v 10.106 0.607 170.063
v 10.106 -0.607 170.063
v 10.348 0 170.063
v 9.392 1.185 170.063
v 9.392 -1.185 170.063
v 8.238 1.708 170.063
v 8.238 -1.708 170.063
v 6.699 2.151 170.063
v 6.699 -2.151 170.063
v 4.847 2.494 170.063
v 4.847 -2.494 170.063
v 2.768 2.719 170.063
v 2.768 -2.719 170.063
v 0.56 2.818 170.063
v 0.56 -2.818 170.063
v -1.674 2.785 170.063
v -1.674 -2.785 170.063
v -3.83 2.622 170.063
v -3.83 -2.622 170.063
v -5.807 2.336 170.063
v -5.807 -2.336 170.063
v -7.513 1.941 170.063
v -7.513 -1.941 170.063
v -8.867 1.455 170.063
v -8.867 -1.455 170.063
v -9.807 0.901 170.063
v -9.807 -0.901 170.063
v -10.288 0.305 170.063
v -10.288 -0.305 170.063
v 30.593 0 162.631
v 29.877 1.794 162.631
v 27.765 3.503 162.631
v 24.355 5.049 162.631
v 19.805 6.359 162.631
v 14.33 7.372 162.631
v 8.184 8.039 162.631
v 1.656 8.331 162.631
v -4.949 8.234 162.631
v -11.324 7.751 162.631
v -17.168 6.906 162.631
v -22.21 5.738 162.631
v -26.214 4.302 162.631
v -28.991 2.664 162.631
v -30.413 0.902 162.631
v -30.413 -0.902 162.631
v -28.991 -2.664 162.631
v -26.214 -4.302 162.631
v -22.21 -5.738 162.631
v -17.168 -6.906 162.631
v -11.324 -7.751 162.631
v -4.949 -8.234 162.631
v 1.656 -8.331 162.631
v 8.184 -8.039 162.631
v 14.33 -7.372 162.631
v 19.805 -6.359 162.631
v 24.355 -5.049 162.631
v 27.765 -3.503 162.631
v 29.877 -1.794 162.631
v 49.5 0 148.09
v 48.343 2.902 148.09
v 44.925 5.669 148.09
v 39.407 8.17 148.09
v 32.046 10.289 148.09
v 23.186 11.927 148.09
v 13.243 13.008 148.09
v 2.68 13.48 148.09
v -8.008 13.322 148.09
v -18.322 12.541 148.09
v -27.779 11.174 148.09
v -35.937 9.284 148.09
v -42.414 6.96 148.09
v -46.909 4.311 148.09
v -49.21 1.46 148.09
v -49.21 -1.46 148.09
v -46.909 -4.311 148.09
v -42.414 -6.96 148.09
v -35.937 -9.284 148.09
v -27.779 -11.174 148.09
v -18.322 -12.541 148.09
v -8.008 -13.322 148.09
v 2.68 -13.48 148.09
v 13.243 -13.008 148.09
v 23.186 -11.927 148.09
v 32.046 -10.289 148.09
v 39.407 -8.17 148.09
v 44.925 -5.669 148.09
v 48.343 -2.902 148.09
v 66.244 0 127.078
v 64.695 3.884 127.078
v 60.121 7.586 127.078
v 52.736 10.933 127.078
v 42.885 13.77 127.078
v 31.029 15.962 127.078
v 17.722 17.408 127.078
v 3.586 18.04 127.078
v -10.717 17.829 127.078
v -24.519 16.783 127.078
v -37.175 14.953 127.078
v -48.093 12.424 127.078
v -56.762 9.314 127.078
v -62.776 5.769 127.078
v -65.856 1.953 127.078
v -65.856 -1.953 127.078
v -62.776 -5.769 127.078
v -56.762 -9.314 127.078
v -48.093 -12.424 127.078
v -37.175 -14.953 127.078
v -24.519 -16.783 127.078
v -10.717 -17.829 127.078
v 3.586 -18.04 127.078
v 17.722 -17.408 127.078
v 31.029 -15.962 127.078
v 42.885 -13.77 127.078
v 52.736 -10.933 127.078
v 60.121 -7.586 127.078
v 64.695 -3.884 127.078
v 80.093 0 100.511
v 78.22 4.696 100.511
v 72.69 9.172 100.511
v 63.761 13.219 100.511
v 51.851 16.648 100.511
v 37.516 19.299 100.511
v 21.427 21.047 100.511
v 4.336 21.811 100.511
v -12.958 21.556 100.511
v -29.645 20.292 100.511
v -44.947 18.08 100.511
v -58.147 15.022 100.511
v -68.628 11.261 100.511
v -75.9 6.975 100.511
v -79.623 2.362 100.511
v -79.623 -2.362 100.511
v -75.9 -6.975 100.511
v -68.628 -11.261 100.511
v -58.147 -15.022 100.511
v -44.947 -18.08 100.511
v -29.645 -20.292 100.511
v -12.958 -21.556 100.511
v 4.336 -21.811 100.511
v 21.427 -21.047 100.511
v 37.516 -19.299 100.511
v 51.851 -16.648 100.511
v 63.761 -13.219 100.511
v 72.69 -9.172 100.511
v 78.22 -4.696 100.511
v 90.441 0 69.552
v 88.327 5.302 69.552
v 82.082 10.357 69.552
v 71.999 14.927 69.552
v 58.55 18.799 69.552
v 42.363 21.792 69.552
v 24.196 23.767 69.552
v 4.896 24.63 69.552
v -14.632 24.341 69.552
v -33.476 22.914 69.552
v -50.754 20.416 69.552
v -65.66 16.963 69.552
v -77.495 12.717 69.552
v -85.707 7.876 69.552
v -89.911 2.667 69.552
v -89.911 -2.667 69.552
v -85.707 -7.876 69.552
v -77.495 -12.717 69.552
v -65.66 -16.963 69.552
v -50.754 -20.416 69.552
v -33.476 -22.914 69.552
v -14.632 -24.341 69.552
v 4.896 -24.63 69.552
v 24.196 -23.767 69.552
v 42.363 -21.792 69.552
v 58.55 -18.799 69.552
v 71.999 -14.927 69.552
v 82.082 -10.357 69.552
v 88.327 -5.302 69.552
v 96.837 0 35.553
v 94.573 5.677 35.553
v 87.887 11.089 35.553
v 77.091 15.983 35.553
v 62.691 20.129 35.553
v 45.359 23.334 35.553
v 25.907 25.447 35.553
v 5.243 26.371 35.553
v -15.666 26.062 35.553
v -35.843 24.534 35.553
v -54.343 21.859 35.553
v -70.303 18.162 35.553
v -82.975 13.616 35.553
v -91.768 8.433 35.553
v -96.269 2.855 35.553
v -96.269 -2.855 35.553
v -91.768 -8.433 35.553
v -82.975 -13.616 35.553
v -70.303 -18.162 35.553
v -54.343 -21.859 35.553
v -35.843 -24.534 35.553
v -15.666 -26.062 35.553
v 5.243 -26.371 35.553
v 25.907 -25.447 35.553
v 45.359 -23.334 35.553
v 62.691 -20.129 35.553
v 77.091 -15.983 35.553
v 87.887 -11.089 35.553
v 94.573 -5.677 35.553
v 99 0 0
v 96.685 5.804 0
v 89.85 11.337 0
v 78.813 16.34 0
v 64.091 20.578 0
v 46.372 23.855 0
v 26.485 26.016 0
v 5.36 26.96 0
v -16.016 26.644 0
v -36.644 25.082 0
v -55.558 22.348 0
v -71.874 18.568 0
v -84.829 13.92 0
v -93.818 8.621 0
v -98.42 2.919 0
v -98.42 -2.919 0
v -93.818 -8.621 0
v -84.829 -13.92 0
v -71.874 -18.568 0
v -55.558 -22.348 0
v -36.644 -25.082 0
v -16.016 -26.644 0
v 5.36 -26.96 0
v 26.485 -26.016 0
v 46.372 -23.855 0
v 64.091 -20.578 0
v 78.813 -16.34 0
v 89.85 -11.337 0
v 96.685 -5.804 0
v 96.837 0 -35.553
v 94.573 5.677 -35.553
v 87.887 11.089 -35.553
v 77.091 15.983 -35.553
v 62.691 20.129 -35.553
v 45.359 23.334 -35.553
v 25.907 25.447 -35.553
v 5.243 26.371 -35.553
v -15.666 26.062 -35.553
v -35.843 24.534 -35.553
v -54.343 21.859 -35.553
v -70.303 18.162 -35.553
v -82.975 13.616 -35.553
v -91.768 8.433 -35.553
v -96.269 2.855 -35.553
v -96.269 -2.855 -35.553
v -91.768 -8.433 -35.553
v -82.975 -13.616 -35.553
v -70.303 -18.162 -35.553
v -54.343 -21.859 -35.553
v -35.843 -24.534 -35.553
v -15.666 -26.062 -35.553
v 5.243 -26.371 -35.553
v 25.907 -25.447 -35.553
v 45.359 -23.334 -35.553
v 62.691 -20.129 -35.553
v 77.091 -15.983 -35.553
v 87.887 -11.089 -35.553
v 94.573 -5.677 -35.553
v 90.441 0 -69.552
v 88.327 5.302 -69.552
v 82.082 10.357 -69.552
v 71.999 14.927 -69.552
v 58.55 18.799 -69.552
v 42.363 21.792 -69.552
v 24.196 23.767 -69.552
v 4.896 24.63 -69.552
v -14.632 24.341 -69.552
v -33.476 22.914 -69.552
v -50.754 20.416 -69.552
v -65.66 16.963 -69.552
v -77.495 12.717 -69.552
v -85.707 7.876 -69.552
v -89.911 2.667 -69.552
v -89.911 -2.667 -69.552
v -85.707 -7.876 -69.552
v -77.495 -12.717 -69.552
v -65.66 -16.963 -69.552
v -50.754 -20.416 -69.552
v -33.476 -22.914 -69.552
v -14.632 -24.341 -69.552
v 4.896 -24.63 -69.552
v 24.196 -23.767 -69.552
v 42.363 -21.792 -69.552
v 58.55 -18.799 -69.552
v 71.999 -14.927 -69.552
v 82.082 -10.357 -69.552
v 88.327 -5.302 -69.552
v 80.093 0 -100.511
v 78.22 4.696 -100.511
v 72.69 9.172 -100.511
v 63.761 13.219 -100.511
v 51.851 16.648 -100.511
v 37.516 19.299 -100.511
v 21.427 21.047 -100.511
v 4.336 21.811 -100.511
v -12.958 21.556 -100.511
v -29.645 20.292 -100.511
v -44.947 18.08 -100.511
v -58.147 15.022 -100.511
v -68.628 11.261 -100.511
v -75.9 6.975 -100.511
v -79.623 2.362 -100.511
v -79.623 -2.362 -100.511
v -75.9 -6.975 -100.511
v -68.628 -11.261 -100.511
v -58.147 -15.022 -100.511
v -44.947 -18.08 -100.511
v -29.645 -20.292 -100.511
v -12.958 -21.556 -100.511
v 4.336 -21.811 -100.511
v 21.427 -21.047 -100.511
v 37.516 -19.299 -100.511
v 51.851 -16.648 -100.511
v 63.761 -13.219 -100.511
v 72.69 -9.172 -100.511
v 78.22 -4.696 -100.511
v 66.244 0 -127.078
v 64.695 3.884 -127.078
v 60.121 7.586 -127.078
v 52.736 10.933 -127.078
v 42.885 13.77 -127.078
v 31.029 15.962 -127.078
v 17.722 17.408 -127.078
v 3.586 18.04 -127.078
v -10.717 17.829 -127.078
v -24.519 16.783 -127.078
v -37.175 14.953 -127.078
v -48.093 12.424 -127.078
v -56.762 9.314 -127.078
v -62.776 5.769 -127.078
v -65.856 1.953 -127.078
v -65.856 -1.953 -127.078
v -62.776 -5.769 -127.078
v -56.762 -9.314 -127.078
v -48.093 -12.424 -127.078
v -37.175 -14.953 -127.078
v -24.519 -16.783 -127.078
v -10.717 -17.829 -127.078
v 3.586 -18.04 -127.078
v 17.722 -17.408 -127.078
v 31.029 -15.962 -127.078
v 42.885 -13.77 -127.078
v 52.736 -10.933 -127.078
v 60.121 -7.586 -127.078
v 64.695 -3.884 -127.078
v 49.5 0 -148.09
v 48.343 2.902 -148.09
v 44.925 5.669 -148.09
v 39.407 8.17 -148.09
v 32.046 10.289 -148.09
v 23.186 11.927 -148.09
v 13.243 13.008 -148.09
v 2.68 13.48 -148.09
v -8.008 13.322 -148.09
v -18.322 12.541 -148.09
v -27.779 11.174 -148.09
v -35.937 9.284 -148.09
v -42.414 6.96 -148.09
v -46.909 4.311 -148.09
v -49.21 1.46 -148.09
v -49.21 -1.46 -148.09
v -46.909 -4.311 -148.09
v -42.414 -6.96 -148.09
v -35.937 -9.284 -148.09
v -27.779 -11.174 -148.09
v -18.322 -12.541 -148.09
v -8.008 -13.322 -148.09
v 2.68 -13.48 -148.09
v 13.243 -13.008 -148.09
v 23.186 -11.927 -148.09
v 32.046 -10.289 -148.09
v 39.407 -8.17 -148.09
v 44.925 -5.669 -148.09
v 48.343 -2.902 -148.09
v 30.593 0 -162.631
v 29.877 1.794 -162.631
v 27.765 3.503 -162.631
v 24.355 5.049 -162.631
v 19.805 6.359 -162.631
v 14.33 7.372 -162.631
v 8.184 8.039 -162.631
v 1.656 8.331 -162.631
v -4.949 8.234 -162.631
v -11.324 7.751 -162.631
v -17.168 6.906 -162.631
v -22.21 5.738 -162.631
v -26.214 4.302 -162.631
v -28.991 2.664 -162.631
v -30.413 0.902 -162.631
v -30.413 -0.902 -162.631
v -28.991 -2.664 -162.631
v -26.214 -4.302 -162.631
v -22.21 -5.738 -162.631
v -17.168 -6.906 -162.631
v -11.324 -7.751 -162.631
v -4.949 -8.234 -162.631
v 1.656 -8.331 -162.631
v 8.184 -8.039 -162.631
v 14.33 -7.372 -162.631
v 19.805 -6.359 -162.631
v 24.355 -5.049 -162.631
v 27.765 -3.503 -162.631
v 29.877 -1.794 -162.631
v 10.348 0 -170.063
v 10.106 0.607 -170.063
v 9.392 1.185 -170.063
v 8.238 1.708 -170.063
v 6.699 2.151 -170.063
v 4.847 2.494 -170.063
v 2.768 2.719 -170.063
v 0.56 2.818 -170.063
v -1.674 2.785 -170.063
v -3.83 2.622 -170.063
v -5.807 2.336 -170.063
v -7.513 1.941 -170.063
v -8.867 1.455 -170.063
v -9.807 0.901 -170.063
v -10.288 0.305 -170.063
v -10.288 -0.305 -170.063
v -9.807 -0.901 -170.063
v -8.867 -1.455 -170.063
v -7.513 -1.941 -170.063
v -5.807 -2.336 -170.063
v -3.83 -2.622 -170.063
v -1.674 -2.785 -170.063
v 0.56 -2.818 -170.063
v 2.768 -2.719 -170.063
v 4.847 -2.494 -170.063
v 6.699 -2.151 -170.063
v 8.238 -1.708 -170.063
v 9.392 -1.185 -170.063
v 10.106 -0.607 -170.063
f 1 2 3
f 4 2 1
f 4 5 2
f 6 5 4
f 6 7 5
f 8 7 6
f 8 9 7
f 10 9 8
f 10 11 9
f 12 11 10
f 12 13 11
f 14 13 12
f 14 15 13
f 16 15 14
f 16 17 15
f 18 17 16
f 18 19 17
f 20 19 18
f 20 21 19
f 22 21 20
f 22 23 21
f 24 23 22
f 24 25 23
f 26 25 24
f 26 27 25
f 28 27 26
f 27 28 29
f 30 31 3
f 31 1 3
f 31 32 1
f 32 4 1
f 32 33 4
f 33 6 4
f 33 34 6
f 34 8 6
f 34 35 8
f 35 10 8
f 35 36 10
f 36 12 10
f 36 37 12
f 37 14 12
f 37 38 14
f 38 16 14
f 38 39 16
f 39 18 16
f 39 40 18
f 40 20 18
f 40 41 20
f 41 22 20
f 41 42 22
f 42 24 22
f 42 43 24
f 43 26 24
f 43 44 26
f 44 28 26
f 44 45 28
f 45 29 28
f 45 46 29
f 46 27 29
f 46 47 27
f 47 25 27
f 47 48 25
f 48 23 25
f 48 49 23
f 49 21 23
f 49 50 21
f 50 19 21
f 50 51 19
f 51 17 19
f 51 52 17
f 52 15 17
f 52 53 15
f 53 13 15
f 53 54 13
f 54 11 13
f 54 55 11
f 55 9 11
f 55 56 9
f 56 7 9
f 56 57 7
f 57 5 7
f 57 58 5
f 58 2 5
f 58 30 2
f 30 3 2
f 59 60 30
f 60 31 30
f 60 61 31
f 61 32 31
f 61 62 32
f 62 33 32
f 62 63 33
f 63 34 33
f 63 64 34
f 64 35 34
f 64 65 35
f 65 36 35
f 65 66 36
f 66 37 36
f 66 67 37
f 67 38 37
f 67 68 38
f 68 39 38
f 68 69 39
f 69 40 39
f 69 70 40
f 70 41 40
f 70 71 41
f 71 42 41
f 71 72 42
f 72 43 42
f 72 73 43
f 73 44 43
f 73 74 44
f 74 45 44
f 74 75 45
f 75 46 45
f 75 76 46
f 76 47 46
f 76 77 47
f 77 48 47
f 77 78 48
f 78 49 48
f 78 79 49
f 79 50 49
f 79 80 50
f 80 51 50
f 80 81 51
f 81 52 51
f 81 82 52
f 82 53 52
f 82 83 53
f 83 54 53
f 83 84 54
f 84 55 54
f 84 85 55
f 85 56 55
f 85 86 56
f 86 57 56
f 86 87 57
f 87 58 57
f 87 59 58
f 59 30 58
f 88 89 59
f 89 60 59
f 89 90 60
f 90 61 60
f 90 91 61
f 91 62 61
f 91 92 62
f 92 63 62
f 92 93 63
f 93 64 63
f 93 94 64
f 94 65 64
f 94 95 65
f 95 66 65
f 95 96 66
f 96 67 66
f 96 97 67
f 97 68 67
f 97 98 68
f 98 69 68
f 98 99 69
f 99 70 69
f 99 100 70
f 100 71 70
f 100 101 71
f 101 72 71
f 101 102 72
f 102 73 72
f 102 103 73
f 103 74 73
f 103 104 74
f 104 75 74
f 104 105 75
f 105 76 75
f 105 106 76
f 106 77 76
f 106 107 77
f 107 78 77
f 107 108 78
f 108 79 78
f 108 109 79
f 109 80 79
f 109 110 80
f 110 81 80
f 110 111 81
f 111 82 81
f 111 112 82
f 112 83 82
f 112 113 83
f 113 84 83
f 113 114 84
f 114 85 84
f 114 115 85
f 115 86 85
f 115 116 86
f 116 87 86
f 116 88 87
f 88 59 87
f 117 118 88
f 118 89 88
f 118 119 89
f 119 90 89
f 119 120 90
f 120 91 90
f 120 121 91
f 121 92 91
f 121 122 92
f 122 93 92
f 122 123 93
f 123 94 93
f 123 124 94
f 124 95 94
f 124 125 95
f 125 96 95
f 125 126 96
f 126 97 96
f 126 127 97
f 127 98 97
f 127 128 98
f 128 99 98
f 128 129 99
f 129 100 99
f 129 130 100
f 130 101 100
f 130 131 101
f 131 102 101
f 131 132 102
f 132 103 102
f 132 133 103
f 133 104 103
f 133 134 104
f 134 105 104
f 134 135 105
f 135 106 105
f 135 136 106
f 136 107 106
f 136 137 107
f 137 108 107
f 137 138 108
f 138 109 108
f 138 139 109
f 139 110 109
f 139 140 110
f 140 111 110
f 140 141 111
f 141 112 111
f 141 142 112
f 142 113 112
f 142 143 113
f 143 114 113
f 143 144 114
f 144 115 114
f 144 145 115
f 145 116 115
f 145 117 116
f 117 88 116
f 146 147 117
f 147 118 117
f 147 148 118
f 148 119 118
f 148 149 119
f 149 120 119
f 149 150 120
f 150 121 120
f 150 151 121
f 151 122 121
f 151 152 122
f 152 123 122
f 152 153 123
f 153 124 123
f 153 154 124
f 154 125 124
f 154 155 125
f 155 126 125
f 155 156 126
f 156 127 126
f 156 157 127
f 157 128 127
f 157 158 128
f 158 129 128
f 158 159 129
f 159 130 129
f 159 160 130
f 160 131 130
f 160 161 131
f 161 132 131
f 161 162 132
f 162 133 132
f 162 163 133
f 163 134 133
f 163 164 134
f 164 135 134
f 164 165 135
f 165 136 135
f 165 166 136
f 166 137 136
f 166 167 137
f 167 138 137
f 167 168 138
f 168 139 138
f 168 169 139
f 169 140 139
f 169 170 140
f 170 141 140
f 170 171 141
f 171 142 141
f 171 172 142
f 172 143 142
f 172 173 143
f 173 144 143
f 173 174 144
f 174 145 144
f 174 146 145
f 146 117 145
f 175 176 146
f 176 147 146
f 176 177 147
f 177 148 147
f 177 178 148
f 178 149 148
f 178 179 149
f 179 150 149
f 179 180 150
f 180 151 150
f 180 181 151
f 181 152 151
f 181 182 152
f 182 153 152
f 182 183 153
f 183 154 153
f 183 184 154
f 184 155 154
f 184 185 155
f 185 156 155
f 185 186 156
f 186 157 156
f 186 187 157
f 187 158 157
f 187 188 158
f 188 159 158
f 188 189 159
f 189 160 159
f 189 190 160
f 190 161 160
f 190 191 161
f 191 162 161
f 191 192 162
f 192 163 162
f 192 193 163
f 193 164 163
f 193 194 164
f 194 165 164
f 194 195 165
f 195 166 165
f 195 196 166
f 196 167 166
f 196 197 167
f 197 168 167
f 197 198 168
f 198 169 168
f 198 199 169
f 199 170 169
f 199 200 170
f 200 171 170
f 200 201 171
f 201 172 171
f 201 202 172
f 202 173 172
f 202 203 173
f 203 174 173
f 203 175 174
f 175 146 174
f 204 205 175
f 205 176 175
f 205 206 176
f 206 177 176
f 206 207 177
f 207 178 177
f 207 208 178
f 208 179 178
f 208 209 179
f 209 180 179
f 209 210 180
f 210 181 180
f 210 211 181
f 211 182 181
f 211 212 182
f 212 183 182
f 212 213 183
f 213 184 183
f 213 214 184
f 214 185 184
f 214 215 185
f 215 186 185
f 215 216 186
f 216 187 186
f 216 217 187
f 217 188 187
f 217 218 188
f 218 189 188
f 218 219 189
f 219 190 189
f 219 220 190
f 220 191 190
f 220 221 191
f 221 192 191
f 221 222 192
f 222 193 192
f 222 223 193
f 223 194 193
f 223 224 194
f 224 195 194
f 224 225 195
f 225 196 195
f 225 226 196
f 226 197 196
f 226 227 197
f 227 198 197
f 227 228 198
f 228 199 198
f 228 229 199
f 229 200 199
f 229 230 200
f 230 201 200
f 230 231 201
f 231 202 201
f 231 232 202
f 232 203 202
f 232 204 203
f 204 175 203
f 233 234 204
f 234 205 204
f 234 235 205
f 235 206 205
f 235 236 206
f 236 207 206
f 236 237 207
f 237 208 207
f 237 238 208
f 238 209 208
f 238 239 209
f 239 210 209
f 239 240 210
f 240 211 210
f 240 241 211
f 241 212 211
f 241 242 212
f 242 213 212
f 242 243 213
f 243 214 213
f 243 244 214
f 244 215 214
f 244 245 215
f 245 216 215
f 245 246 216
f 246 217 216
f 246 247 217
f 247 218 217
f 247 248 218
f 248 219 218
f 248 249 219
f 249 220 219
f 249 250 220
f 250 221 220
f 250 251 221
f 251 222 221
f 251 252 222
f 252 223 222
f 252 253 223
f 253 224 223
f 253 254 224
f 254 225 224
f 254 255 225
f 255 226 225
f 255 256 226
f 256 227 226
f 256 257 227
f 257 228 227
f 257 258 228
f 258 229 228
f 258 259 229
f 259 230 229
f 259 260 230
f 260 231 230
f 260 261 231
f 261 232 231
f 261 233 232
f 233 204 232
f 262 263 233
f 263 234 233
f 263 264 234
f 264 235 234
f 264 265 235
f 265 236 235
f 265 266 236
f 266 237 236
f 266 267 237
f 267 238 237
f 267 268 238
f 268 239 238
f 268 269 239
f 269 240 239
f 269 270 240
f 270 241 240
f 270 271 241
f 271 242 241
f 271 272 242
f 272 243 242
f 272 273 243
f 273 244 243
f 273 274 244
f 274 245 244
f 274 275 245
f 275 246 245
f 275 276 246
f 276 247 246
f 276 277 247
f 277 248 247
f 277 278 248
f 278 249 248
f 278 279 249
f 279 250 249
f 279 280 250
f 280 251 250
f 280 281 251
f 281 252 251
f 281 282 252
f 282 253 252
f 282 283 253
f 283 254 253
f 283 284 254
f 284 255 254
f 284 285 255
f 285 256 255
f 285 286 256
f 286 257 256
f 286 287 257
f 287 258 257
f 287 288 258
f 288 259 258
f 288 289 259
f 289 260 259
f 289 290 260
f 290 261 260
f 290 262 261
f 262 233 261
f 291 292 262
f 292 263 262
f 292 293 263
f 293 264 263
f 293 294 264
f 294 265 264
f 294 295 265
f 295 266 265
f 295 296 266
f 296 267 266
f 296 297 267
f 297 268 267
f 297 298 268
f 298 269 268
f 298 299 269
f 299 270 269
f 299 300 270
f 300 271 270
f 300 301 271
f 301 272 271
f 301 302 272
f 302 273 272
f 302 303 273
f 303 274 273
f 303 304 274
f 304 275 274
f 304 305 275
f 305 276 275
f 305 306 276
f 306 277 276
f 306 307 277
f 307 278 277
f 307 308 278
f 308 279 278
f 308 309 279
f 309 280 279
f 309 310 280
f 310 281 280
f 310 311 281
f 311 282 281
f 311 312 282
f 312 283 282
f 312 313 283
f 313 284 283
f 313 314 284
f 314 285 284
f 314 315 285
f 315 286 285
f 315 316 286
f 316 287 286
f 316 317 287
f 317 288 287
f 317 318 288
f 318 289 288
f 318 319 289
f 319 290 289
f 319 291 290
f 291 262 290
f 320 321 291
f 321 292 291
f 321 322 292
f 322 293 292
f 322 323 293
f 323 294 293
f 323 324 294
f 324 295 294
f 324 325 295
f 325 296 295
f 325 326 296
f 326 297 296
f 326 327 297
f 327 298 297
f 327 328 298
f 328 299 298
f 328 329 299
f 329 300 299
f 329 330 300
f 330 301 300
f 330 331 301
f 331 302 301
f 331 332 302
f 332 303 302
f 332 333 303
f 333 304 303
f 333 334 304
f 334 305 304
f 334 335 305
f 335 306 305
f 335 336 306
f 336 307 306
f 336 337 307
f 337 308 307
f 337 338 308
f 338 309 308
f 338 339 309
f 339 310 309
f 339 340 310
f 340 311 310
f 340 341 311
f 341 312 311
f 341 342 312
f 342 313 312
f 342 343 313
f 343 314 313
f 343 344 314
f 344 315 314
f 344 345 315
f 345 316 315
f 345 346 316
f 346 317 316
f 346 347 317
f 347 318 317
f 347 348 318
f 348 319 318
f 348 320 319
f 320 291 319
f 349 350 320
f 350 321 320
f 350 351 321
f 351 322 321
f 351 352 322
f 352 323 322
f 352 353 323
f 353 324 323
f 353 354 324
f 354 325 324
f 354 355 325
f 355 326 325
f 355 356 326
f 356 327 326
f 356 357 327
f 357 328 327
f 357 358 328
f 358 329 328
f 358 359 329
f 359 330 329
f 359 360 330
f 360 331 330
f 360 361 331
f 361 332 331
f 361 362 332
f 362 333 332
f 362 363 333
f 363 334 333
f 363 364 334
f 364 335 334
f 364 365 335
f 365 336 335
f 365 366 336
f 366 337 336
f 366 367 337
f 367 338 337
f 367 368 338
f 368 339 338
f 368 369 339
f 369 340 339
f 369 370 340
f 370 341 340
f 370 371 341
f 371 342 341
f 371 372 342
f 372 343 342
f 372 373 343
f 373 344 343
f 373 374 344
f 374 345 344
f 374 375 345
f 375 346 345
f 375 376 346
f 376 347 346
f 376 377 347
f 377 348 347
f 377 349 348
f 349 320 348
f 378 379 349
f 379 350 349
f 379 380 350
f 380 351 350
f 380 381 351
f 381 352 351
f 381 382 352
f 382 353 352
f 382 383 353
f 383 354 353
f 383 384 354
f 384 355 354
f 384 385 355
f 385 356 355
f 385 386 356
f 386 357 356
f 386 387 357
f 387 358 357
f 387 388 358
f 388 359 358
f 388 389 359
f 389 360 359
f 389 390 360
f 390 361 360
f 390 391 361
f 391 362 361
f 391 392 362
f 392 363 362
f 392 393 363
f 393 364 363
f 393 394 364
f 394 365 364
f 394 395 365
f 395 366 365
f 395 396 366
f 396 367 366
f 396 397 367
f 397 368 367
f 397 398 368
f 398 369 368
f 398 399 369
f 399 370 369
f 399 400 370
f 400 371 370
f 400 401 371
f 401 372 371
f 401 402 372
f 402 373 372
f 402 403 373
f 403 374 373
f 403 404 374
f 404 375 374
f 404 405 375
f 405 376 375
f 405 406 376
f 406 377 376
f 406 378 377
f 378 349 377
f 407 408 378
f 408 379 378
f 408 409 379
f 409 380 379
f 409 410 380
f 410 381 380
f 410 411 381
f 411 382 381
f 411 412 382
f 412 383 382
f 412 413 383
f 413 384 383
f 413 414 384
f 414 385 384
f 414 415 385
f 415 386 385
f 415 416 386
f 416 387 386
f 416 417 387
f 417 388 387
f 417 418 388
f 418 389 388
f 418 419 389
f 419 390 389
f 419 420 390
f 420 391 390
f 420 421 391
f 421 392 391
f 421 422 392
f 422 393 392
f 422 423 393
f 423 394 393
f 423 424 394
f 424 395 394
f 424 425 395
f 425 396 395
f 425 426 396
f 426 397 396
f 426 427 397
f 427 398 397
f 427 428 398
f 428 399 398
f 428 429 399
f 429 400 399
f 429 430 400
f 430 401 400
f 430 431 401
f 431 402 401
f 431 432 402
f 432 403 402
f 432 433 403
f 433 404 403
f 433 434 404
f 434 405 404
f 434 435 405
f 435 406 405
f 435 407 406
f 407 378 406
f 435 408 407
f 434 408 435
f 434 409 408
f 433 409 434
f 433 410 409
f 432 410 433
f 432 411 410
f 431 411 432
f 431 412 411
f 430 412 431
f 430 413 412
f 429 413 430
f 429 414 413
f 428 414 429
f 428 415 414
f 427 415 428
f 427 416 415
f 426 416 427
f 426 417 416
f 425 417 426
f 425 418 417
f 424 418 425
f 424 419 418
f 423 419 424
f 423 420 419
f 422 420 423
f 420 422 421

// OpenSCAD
// Generated by SolidPython 1.0.1 on 2020-07-29 00:46:49


scale(v = [11, 3, 19]) {
	sphere(r = 9);
}
/***********************************************
*********      SolidPython code:      **********
************************************************
 
# import packages: SolidPython
from solid import *
from solid.utils import *
from itertools import chain, combinations, permutations


class Resize:

    def __init__(self, scad_file):
        self.scad_file = scad_file
        #self.scad_file = import_scad(scad_file)
        # cone/cylinder param:
        self.r1 = 0
        self.r2 = 0
        self.h = 0
        # rectangular prism param:
        self.w = 0
        self.l = 0
        # ellipse param:
        self.r = 0

    # import OpenScad code (file name corresponds to shape)


    # classify shape + parameters
    def assign(self, param1, param2, param3):
        if self.scad_file == 'cone.scad':
            self.r1 = param1
            self.r2 = param2
            self.h = param3
        elif self.scad_file == 'cylinder.scad':
            self.r1 = param1
            self.r2 = param2
            self.h = param3
        elif self.scad_file == 'rectangularPrism.scad':
            self.h = param1
            self.l = param2
            self.w = param3
        else:
            self.r = param1
            self.h = param2

    # resize parameters
    def iterate(self):
        x = range(3, 20, 2)
        i = 1
        if self.scad_file == 'cone.scad':
            tempList = list(permutations(x, 2))
            for temp in tempList:
                param1 = temp[0]
                param2 = temp[1]
                filepath = 'produced_scad_files/' + 'cone' + str(param1) + '_' + str(param2) + '_' + '.scad'
                scad_render_to_file(cylinder(h=param1, r1=param2, r2=0), filepath)

        elif self.scad_file == 'cylinder.scad':
            tempList = list(permutations(x, 3))
            for temp in tempList:
                param1 = temp[0]
                param2 = temp[1]
                filepath = 'produced_scad_files/' + 'cylinder' + str(param1) + '_' + str(param2) + '_' + '.scad'
                scad_render_to_file(cylinder(h=param1, r1=param2, r2=param2), filepath)

        elif self.scad_file == 'rectangularPrism.scad':
            tempList = list(permutations(x, 3))
            for temp in tempList:
                param1 = temp[0]
                param2 = temp[1]
                param3 = temp[2]
                filepath = 'produced_scad_files/' + 'rectangularPrism' + str(param1) + '_' + str(param2) + '_' + str(
                    param3) + '.scad'
                scad_render_to_file(cube(size=(param1, param2, param3)), filepath)

        elif self.scad_file == 'ellipse.scad':
            tempList = list(permutations(x, 4))
            for temp in tempList:
                param1 = temp[0]
                param2 = temp[1]
                param3 = temp[2]
                param4 = temp[3]
                filepath = 'produced_scad_files/' + 'ellipse' + str(param1) + '_' + str(param2) + '_' + str(param3) + '_' + str(param4) + '.scad'
                scad_render_to_file(scale([param1, param2, param3])(sphere(r=param4)), filepath)

    def render_to_scadfile(self):
        scad_render_to_file(scad, 'example.scad') 
 
************************************************/
